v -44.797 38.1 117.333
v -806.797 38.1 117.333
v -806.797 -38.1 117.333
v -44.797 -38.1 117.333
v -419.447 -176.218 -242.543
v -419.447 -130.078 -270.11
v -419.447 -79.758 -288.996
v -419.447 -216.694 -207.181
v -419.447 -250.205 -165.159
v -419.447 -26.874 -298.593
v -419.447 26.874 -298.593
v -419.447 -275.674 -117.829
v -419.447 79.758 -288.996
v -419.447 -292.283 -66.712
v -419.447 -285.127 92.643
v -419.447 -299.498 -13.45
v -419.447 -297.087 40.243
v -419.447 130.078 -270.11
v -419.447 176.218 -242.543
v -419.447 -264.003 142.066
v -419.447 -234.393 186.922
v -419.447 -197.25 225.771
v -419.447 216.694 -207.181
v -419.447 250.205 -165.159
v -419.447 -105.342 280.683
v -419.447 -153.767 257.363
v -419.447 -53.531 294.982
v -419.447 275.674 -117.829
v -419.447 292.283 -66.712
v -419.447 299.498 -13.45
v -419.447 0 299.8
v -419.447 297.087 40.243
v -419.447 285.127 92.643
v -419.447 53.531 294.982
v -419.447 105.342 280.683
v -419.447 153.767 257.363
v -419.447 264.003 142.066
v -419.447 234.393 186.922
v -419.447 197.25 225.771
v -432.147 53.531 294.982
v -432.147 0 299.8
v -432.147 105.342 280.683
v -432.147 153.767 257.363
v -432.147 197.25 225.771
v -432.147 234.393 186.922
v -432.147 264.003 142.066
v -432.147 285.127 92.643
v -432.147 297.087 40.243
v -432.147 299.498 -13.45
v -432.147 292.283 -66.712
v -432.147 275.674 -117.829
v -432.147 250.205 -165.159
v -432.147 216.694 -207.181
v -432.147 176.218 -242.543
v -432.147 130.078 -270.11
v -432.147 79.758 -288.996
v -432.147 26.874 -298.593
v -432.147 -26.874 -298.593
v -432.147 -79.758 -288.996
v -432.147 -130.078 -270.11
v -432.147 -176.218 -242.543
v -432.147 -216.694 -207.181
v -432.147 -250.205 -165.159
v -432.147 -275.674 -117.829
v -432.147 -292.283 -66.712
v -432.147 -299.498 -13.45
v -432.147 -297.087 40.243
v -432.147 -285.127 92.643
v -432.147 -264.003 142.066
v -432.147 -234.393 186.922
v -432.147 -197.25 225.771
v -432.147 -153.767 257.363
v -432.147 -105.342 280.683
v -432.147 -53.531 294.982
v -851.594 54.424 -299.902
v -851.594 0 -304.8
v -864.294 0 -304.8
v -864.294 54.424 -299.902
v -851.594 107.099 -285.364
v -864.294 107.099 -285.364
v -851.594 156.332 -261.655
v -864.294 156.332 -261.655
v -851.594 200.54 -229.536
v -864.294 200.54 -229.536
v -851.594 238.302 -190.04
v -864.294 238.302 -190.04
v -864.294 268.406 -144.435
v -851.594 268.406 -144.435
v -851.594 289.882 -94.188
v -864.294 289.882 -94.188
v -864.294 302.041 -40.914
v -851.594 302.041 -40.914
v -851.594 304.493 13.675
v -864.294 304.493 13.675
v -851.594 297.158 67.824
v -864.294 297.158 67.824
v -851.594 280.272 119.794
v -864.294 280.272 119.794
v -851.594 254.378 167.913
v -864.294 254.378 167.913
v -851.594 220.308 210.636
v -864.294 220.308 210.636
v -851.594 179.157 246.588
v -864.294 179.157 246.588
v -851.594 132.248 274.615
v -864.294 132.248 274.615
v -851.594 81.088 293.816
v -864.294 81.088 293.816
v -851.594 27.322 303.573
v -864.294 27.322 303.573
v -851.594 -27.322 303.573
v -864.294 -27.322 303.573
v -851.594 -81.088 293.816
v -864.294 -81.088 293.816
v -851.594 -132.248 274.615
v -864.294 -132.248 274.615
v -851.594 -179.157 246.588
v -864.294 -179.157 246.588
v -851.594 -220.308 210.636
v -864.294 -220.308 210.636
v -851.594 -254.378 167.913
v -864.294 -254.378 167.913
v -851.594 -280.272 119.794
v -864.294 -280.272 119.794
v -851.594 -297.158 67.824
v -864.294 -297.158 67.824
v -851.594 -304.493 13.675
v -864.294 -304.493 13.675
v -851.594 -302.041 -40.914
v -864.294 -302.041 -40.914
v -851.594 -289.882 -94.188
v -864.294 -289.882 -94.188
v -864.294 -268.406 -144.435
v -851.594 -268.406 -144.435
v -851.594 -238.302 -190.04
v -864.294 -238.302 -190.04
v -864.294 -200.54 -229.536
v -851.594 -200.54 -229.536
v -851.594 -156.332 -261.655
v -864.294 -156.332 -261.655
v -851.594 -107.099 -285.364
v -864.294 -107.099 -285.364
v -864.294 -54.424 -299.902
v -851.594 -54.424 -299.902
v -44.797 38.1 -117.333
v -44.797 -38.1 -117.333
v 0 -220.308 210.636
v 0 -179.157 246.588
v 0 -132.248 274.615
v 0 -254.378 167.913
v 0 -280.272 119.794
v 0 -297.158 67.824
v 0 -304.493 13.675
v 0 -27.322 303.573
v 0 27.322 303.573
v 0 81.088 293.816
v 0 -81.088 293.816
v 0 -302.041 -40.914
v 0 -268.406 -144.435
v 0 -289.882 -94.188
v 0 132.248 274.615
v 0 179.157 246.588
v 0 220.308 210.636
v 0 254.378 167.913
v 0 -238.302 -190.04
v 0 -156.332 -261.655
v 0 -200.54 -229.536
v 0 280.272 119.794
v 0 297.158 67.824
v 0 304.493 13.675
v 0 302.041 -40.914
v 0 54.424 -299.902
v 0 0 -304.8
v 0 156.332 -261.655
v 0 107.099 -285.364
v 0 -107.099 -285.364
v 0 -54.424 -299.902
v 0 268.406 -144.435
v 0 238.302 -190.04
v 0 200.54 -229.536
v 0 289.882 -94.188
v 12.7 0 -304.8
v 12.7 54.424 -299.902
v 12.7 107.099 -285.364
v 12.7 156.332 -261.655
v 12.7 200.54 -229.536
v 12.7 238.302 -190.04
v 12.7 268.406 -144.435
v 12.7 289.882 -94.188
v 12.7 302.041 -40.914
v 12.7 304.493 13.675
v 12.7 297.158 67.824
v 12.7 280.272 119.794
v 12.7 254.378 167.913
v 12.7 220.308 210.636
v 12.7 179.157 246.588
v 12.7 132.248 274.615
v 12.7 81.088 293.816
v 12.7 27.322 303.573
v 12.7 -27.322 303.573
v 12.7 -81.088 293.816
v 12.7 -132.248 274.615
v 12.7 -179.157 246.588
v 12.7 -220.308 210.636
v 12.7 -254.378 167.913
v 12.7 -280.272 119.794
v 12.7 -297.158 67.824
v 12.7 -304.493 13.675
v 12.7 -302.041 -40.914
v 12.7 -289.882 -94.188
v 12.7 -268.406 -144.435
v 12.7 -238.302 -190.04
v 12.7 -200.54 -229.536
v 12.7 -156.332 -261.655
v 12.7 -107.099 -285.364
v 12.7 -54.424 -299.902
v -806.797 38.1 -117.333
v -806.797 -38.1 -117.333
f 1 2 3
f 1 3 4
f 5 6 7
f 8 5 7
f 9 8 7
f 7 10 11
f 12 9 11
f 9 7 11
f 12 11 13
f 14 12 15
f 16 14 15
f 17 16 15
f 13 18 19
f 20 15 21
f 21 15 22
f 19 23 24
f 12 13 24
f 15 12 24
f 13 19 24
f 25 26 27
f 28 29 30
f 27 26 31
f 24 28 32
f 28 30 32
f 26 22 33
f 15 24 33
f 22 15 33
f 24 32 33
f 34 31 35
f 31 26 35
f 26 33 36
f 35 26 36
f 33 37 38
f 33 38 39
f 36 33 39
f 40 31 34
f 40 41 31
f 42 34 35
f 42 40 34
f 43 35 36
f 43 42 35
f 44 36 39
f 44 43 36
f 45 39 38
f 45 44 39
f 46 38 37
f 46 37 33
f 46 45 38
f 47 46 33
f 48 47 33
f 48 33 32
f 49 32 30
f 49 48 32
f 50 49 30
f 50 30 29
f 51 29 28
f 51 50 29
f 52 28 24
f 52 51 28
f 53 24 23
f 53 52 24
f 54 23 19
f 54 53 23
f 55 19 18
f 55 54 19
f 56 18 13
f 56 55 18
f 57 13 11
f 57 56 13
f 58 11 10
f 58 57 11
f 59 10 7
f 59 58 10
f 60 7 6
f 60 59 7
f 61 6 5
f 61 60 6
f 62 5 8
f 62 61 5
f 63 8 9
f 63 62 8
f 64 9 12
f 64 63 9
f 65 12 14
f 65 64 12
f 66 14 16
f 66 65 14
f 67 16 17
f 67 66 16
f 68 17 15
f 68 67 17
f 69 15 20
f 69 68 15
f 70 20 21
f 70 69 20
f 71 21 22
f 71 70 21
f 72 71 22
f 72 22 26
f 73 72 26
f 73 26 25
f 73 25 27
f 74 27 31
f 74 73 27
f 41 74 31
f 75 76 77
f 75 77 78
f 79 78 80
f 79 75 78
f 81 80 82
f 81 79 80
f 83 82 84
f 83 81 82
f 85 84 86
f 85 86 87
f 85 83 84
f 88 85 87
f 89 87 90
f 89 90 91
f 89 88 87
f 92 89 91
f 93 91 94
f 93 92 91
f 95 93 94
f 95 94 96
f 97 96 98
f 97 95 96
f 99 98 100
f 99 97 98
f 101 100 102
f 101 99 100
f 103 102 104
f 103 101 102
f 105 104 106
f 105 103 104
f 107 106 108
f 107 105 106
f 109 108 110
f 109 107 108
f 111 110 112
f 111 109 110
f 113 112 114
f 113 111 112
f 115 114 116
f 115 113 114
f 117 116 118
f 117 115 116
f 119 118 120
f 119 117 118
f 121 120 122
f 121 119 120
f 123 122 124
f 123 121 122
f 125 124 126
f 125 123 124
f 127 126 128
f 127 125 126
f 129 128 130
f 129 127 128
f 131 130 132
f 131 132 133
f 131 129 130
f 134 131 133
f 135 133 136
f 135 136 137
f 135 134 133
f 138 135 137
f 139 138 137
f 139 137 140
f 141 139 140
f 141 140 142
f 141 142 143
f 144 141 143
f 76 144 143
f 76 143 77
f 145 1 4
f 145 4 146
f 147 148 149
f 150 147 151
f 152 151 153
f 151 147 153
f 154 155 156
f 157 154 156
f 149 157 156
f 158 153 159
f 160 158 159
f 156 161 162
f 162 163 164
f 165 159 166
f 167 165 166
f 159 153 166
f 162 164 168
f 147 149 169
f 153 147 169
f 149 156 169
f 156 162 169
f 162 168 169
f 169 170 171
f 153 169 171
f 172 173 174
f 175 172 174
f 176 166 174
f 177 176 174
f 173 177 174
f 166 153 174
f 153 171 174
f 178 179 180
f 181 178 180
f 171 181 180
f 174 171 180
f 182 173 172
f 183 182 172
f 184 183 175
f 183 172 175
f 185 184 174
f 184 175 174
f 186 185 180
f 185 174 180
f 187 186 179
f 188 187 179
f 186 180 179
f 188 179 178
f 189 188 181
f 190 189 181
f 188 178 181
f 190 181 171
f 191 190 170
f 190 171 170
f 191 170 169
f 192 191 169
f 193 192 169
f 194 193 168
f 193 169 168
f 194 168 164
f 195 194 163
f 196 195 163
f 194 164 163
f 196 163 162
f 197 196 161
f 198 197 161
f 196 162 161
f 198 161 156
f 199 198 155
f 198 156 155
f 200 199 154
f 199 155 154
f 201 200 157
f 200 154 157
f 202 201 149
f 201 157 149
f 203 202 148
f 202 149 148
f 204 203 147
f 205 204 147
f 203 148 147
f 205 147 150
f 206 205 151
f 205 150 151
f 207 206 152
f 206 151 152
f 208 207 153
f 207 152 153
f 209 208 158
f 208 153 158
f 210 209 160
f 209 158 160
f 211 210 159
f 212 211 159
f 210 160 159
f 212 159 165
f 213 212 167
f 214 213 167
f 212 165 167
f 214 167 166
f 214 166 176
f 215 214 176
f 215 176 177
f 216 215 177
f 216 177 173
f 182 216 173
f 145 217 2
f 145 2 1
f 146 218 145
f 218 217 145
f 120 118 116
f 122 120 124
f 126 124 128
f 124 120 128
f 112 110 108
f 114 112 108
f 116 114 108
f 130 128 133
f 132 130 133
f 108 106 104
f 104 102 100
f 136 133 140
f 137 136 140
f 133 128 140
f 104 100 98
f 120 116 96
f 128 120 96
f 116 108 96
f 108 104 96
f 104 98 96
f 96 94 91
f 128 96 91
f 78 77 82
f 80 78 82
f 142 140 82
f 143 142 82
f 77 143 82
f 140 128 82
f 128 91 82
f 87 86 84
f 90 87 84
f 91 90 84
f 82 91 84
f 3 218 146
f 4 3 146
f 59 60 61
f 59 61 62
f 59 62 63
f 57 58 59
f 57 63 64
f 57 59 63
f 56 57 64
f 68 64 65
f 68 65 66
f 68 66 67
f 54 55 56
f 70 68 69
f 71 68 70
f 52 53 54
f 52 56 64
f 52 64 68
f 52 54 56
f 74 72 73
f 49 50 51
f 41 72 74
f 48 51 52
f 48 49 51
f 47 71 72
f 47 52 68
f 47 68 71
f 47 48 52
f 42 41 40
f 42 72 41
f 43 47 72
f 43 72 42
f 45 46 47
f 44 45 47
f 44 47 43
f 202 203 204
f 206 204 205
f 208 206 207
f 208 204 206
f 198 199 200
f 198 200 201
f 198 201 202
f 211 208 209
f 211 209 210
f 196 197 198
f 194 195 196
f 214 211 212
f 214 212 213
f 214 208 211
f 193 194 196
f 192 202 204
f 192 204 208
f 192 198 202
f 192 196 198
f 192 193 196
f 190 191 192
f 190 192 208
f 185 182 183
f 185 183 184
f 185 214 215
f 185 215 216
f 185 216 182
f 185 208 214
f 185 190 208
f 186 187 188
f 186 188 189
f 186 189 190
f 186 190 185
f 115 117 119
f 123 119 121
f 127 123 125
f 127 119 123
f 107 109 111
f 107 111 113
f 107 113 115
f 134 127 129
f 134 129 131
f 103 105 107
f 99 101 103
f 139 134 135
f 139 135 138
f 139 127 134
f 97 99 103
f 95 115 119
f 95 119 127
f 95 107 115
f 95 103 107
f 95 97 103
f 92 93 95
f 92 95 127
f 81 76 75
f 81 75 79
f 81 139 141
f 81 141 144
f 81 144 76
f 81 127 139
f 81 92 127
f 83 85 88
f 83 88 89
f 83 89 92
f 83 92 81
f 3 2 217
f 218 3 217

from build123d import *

# Parameters (mm, degrees)
SKETCH2_R           = 304.8
BOSS_EXTRUDE1_DEPTH = 12.7
SKETCH3_W           = 762
SKETCH3_H           = 234.666318372
BOSS_EXTRUDE2_DEPTH = 38.1
SKETCH4_R           = 299.8
BOSS_EXTRUDE3_DEPTH = 6.35


with BuildPart() as part:
    # Sketch2 → Boss-Extrude1 (new body)
    with BuildSketch(Plane(origin=(0, 0, 0), x_dir=(0, 0, -1), z_dir=(1, 0, 0))):
        Circle(SKETCH2_R)
    extrude(amount=BOSS_EXTRUDE1_DEPTH)


with BuildPart() as body_2:
    # Sketch3 → Boss-Extrude2 (new, symmetric)
    with BuildSketch(Plane(origin=(0, 0, 0), x_dir=(1, 0, 0), z_dir=(0, 1, 0))):
        with Locations((-425.796880592, 0)):
            Rectangle(SKETCH3_W, SKETCH3_H)
    extrude(amount=BOSS_EXTRUDE2_DEPTH, both=True)


with BuildPart() as body_3:
    # Sketch4 → Boss-Extrude3 (new, symmetric)
    with BuildSketch(Plane.ZY.offset(425.796880592)):
        Circle(SKETCH4_R)
    extrude(amount=BOSS_EXTRUDE3_DEPTH, both=True)


with BuildPart() as body_4:
    # Mirror1: mirrored copy
    add(part.part.mirror(Plane.ZY.offset(425.796880592)))


solid = Compound([part.part, body_2.part, body_3.part, body_4.part])
